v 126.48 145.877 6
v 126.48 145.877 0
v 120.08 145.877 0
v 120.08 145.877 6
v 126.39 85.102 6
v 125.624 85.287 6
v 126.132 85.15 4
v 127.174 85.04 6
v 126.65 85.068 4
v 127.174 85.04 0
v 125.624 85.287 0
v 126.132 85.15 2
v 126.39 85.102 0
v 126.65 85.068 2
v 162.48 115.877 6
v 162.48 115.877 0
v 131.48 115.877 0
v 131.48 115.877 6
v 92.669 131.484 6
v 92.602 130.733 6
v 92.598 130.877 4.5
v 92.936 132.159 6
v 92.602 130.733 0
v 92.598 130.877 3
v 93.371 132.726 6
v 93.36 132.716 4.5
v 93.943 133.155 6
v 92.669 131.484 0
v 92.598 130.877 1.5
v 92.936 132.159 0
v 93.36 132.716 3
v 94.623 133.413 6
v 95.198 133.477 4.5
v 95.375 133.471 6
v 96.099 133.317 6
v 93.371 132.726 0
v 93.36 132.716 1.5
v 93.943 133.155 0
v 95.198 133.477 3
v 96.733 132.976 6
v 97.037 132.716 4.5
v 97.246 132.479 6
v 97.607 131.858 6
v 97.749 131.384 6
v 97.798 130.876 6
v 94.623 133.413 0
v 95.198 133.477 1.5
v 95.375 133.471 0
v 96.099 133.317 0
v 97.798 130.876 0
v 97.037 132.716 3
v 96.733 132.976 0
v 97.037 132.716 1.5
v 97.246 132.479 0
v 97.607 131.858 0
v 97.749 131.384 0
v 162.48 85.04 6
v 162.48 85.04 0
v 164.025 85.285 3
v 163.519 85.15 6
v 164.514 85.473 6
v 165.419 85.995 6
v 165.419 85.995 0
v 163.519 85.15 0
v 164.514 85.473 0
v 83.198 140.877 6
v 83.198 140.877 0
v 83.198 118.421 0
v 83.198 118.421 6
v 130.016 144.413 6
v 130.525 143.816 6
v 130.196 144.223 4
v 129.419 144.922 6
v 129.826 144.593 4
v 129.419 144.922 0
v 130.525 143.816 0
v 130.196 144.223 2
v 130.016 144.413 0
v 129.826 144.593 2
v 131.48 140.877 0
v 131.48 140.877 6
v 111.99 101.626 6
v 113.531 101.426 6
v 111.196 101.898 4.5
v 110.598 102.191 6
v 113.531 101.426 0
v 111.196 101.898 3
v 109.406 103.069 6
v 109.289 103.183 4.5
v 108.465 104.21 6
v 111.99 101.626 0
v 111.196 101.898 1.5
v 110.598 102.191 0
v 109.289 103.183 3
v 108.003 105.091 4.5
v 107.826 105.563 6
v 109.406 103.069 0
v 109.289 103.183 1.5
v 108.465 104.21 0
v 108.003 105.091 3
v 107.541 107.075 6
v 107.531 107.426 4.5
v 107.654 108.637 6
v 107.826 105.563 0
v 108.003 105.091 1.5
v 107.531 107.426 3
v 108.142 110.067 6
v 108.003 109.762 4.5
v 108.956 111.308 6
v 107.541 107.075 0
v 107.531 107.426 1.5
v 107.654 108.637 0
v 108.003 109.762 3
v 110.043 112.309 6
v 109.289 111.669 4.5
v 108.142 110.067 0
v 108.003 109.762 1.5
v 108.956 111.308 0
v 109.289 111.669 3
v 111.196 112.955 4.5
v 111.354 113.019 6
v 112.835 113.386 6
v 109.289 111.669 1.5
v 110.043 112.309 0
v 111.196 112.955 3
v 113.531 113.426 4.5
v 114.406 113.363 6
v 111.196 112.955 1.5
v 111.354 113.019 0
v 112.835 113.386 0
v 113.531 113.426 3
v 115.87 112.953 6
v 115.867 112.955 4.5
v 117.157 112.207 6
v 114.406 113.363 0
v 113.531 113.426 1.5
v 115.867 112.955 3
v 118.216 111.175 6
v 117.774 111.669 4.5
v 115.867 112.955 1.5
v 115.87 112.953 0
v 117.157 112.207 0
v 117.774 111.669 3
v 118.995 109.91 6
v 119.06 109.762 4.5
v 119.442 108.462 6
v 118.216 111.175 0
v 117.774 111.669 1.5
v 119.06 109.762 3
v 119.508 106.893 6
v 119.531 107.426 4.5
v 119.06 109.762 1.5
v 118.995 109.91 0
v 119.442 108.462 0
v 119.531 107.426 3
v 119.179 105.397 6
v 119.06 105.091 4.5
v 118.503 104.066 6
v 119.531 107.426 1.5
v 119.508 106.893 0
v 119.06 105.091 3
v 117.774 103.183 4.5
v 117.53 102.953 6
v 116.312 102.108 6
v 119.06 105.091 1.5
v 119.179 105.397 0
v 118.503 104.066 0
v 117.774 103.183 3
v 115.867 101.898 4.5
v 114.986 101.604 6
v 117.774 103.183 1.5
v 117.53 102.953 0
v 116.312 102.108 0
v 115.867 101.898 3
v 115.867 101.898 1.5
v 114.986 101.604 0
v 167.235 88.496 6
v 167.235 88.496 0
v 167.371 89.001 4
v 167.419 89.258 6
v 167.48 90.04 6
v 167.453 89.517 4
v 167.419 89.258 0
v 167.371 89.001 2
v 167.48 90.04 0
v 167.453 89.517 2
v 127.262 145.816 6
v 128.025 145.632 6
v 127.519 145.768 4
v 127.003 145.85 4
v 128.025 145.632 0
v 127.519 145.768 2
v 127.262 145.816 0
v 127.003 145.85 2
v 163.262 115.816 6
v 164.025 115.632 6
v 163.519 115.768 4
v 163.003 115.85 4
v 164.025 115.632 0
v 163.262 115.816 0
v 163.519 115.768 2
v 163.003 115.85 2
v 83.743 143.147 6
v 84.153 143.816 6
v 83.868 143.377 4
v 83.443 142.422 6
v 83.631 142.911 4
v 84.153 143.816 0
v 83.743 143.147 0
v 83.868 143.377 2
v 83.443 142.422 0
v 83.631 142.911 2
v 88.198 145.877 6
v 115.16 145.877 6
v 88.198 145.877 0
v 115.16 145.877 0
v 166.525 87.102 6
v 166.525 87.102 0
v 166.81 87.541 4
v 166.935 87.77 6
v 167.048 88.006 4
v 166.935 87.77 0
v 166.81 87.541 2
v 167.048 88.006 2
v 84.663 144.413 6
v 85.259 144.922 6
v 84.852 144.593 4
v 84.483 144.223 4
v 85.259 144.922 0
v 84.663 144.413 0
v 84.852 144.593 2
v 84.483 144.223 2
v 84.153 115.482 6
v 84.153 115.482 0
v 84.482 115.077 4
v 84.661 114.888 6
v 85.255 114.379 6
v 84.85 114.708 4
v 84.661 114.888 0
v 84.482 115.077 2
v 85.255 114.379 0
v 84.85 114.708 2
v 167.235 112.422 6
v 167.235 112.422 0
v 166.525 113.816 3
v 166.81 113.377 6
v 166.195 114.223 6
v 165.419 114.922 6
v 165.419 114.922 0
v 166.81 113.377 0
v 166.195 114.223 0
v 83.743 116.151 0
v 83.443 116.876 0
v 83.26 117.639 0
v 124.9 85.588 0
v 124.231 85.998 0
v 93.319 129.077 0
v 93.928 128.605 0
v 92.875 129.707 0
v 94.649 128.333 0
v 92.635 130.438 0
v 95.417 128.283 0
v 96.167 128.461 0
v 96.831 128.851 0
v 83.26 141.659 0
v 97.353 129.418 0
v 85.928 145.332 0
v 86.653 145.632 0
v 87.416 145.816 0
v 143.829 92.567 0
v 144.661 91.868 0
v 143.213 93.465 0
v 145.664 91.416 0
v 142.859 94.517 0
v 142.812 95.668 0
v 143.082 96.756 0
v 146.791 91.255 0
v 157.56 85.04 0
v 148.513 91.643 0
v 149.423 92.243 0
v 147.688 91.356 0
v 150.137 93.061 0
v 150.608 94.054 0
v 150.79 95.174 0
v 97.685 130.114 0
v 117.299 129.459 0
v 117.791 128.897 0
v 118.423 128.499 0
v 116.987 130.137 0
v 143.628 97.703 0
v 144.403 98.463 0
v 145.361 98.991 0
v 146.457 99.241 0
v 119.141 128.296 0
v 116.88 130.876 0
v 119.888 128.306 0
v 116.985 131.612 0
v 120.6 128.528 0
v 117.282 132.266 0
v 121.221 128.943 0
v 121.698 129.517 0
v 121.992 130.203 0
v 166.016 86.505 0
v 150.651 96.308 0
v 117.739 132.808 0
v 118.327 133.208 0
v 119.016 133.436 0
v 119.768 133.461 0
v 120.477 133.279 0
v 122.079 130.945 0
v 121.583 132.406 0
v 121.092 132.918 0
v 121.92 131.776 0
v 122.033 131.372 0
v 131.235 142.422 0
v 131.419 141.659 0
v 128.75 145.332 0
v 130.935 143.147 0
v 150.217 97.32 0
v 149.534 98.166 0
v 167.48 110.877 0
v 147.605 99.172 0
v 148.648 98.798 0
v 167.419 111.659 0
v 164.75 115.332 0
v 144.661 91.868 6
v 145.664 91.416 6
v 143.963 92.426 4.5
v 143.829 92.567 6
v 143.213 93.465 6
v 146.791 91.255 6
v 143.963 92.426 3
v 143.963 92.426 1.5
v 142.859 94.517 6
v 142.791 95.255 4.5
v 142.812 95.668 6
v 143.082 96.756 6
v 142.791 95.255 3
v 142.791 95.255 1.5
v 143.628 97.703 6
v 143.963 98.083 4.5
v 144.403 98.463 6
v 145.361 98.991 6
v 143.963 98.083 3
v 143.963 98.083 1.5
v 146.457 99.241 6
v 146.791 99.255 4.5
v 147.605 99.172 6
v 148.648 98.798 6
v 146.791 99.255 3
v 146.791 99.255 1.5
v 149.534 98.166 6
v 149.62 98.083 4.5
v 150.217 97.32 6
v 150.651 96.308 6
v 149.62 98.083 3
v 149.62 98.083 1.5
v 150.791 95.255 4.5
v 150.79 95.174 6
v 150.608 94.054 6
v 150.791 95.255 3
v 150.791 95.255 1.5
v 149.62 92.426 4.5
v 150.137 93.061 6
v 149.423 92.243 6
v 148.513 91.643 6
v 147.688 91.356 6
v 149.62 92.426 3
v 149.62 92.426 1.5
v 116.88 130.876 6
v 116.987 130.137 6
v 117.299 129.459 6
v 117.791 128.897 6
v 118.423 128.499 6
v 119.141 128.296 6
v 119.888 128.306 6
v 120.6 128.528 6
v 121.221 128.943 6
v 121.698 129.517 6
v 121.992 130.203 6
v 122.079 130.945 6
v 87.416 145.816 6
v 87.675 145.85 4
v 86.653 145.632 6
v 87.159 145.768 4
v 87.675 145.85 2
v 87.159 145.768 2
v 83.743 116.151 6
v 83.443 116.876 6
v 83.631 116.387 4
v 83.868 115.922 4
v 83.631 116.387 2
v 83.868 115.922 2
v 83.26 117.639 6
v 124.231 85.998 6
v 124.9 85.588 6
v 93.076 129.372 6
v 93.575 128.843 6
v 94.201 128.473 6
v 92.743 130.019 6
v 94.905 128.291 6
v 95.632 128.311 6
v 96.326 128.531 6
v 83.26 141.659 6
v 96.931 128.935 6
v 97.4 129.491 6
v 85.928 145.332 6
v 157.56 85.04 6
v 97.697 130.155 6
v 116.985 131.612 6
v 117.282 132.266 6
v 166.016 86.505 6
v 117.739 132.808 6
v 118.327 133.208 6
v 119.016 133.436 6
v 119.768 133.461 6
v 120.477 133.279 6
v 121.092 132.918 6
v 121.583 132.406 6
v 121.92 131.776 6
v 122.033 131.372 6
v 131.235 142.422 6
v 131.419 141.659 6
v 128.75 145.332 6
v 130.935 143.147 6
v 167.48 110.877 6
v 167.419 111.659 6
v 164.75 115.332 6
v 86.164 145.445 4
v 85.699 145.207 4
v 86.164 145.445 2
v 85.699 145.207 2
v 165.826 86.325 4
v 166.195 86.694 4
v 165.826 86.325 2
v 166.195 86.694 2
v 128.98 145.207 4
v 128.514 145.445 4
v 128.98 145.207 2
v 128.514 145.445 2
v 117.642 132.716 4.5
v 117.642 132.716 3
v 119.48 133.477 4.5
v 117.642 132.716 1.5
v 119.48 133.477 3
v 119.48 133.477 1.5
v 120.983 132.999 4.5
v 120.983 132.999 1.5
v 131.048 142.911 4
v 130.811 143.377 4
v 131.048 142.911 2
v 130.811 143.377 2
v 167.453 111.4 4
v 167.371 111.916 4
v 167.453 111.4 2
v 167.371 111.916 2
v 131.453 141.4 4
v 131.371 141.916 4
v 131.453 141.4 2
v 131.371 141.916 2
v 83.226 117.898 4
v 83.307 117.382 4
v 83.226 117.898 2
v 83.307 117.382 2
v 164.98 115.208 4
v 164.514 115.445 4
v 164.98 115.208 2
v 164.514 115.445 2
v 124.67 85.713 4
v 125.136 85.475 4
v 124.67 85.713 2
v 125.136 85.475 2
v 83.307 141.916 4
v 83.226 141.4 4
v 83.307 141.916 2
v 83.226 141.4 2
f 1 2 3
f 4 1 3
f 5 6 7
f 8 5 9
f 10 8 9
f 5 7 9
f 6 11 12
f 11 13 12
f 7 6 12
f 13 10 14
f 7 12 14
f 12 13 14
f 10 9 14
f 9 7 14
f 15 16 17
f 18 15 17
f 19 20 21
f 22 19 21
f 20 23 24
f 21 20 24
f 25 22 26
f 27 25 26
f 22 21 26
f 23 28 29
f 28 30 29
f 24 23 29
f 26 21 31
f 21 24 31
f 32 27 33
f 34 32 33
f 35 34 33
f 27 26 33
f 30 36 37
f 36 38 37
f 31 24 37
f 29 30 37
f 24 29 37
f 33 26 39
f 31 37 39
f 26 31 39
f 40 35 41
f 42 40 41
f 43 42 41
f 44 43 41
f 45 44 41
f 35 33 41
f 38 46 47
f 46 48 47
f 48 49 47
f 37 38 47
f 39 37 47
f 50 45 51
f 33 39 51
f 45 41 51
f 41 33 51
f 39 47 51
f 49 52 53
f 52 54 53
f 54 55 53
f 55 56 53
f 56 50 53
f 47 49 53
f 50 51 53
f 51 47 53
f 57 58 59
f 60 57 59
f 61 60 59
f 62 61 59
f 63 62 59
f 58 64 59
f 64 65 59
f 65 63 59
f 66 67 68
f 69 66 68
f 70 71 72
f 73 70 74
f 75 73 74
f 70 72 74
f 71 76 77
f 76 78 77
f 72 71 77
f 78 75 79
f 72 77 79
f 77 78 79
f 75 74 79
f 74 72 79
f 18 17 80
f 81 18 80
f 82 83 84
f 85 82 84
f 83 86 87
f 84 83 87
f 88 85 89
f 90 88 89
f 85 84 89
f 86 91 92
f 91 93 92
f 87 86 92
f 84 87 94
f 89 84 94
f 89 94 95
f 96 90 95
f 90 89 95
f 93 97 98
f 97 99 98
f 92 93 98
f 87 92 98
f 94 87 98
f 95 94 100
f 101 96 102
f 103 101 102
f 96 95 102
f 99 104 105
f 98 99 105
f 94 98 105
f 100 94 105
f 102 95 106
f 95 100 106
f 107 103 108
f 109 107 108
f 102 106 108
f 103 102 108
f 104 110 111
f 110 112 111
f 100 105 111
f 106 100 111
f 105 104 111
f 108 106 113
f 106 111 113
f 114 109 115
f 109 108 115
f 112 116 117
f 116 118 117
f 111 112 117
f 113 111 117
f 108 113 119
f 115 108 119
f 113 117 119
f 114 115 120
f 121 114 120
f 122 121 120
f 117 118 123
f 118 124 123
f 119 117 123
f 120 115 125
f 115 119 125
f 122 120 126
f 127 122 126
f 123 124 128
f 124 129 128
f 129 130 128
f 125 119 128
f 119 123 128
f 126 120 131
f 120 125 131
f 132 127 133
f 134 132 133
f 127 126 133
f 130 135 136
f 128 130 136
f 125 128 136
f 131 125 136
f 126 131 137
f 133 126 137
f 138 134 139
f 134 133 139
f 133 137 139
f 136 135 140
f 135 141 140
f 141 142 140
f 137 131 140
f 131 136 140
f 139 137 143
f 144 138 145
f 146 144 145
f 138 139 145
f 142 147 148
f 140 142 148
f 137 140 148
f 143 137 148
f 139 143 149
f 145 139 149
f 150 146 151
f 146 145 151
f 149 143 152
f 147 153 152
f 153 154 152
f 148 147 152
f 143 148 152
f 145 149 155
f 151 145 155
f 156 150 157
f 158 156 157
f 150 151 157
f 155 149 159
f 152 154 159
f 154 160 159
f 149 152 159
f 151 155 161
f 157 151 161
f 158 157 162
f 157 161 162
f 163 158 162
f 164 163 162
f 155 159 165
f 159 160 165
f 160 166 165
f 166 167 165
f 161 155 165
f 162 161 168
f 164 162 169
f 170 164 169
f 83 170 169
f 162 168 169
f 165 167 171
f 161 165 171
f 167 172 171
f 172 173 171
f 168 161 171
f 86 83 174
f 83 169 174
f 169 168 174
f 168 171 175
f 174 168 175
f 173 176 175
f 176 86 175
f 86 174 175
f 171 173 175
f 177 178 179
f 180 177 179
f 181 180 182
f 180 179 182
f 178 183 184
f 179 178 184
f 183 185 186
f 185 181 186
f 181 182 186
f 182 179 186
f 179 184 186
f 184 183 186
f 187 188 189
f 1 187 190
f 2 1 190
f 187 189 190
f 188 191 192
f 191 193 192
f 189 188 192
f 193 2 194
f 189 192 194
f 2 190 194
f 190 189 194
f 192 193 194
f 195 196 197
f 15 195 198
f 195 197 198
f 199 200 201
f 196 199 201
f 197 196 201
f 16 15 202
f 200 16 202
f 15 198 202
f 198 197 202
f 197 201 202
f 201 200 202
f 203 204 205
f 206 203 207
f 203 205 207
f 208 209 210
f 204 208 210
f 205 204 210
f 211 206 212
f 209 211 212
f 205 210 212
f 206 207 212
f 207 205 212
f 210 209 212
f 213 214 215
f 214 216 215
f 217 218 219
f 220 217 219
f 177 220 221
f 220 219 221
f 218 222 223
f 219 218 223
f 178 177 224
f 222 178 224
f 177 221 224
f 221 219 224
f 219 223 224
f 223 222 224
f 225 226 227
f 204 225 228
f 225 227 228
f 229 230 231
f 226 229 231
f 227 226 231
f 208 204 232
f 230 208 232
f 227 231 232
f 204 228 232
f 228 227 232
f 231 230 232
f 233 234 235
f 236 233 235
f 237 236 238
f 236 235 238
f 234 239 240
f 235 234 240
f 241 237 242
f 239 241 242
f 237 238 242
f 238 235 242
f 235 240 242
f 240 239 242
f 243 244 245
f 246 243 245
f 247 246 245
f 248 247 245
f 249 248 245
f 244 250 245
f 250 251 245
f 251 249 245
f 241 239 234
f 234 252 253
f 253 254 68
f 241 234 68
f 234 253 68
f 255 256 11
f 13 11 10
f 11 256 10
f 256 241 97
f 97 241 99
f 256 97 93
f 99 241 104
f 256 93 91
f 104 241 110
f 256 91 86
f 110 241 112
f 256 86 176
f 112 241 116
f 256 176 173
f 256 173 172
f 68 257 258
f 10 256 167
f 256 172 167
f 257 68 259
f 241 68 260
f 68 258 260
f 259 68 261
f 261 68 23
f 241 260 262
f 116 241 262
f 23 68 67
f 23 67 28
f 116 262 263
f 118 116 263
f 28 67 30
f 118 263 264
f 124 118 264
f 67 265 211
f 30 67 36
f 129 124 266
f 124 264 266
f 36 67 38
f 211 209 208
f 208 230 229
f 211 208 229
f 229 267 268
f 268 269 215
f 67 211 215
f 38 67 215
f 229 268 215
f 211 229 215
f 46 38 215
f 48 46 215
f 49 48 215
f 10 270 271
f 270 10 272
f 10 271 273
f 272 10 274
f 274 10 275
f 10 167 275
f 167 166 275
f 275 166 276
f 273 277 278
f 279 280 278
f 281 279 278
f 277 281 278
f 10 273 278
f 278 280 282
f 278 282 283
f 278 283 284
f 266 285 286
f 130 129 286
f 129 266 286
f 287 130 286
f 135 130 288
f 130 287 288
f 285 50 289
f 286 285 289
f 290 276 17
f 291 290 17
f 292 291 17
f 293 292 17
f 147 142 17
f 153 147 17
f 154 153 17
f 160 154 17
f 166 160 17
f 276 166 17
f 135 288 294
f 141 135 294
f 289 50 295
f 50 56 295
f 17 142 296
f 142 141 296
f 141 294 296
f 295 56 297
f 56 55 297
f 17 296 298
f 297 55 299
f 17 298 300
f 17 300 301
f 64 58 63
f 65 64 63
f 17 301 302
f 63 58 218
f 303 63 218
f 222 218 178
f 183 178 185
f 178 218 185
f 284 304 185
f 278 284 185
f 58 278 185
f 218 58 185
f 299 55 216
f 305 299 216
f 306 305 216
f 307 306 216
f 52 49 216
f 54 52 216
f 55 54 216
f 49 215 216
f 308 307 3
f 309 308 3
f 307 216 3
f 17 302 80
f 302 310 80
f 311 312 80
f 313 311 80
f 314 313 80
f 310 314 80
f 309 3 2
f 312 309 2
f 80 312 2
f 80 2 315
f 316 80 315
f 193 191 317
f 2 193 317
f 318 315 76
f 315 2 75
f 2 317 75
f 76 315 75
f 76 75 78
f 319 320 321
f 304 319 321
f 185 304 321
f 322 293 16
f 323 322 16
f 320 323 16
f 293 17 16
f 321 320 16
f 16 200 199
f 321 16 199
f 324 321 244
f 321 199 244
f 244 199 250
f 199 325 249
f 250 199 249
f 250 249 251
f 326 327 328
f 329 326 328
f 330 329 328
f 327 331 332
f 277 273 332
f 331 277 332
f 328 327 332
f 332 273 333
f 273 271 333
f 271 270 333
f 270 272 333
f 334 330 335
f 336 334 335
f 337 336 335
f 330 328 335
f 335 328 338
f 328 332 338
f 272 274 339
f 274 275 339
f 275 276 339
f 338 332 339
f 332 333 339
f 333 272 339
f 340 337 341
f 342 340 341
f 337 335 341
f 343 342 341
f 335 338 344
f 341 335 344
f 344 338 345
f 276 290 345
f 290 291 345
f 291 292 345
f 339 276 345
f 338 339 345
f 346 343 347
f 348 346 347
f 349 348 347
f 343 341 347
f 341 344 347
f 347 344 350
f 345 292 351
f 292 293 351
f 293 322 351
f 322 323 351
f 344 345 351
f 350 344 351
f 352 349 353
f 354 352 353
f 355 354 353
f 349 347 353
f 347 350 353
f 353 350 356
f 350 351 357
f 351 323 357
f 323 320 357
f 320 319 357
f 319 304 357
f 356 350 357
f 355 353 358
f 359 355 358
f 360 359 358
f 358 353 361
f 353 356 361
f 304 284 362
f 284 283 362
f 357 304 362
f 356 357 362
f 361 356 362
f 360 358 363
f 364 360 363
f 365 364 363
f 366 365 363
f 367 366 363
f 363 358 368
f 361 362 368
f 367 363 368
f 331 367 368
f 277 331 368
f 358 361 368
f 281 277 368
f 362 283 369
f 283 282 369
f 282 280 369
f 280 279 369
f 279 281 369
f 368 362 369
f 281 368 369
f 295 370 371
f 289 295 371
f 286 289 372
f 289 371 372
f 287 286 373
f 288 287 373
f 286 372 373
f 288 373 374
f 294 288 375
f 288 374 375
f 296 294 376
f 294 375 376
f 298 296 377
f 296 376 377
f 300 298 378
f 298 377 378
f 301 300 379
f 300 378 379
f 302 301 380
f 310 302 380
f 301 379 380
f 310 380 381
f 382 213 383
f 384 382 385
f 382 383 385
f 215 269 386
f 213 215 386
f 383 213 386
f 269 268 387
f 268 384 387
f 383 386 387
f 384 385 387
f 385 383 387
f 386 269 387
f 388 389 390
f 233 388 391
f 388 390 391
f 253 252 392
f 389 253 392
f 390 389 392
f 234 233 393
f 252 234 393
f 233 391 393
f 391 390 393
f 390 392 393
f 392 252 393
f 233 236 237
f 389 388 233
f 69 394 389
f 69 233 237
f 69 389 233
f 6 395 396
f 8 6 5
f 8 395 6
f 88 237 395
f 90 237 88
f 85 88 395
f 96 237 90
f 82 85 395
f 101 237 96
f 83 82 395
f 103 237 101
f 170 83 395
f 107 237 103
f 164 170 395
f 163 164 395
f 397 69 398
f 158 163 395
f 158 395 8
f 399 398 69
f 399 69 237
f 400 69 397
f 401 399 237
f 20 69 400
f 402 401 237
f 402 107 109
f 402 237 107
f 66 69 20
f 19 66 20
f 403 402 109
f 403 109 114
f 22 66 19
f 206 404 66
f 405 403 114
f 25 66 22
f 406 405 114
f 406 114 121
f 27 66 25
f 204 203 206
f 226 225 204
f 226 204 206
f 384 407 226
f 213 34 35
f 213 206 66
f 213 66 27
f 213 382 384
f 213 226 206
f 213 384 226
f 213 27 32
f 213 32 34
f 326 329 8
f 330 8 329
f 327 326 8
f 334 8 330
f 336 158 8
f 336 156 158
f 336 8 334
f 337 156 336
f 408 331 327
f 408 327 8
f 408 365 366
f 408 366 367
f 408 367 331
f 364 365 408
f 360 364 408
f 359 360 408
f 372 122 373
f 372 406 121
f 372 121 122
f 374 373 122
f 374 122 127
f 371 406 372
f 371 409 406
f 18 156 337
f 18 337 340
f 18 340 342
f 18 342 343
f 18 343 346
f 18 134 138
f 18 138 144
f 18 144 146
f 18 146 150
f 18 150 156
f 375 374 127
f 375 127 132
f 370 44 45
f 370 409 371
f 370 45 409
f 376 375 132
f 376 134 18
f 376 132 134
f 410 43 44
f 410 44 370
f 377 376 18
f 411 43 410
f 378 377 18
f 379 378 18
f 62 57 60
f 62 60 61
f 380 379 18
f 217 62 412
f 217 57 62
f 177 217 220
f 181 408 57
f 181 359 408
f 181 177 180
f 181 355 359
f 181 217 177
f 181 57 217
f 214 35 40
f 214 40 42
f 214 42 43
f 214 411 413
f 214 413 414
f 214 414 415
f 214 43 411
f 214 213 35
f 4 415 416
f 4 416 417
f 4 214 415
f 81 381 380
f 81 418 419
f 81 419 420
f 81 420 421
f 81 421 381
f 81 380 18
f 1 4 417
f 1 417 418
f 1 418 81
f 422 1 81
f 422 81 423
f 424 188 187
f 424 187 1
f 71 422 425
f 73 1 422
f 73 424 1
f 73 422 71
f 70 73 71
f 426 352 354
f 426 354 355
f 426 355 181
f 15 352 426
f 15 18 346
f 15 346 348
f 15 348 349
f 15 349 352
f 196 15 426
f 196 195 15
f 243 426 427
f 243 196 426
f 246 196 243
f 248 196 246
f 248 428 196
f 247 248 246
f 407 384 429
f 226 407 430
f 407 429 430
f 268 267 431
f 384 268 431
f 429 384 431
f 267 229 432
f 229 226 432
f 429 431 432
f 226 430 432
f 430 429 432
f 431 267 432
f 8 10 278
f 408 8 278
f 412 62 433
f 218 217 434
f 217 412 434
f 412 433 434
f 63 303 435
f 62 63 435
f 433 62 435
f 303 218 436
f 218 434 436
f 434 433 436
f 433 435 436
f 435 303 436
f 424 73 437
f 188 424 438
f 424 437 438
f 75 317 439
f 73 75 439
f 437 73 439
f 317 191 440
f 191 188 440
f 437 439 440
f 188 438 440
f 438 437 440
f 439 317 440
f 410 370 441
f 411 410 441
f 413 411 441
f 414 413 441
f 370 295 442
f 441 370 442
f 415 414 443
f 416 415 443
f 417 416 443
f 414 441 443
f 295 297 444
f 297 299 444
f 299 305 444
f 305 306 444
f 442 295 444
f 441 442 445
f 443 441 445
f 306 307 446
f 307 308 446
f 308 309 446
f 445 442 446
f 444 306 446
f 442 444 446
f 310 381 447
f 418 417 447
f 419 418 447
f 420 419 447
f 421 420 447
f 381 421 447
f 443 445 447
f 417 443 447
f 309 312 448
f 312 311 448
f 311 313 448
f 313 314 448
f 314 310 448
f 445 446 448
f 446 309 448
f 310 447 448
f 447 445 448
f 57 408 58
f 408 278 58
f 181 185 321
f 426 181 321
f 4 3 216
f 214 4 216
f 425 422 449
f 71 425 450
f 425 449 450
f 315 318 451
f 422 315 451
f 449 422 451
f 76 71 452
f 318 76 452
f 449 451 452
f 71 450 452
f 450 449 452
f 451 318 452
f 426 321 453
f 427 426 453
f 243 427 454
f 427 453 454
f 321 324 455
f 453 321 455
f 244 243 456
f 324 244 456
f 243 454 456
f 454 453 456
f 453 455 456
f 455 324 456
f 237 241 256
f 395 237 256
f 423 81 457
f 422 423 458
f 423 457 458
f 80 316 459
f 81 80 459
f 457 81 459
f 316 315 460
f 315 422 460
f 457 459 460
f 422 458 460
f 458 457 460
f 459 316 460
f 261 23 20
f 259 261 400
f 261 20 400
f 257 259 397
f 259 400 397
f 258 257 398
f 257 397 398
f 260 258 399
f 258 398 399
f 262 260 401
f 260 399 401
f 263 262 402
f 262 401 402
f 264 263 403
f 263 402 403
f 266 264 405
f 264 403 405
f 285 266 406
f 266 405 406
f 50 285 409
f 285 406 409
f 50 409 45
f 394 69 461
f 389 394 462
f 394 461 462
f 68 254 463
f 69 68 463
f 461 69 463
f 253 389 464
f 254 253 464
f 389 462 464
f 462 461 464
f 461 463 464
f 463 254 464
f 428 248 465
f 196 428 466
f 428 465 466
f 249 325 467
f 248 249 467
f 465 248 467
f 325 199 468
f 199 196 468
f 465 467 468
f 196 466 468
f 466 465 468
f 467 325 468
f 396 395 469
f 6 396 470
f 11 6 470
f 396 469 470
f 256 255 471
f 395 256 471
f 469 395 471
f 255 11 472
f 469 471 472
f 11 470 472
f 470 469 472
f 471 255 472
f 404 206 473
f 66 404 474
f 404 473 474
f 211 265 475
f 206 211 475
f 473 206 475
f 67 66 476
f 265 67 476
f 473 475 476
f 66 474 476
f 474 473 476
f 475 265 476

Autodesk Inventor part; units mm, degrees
ref_plane "YZ Plane" through (0, 0, 0) normal (1, 0, 0) x (0, 1, 0)
ref_plane "XZ Plane" through (0, 0, 0) normal (0, 1, 0) x (-1, 0, 0)
ref_plane "XY Plane" through (0, 0, 0) normal (0, 0, 1) x (1, 0, 0)
sketch "Sketch1" plane through (0, 0, 0) normal (0, 0, 1) x (1, 0, 0)
  line L0 (83.1982, 140.877) -> (83.1982, 118.4214)
  spline S0 degree 3 poles (83.1982, 118.4214) (83.1982, 117.8956) (83.2805, 117.3761) (83.443, 116.8762) knots 1 1 1 1 2 2 2 2
  line L1 (83.1982, 118.4214) -> (83.1982, 117.8956) construction
  line L2 (83.1982, 117.8956) -> (83.2805, 117.3761) construction
  line L3 (83.2805, 117.3761) -> (83.443, 116.8762) construction
  spline S1 degree 3 poles (83.443, 116.8762) (83.6054, 116.3762) (83.8442, 115.9078) (84.1532, 115.4824) knots 2 2 2 2 3 3 3 3
  line L4 (83.443, 116.8762) -> (83.6054, 116.3762) construction
  line L5 (83.6054, 116.3762) -> (83.8442, 115.9078) construction
  line L6 (83.8442, 115.9078) -> (84.1532, 115.4824) construction
  spline S2 degree 3 poles (84.1532, 115.4824) (84.4612, 115.0586) (84.8315, 114.6879) (85.2551, 114.3792) knots 3 3 3 3 4 4 4 4
  line L7 (84.1532, 115.4824) -> (84.4612, 115.0586) construction
  line L8 (84.4612, 115.0586) -> (84.8315, 114.6879) construction
  line L9 (84.8315, 114.6879) -> (85.2551, 114.3792) construction
  line L10 (85.2551, 114.3792) -> (124.2313, 85.9985)
  spline S3 degree 3 poles (124.2313, 85.9985) (124.6565, 85.689) (125.1247, 85.4497) (125.6245, 85.2868) knots 5 5 5 5 6 6 6 6
  line L11 (124.2313, 85.9985) -> (124.6565, 85.689) construction
  line L12 (124.6565, 85.689) -> (125.1247, 85.4497) construction
  line L13 (125.1247, 85.4497) -> (125.6245, 85.2868) construction
  spline S4 degree 3 poles (125.6245, 85.2868) (126.1262, 85.1233) (126.647, 85.0405) (127.1745, 85.0405) knots 6 6 6 6 7 7 7 7
  line L14 (125.6245, 85.2868) -> (126.1262, 85.1233) construction
  line L15 (126.1262, 85.1233) -> (126.647, 85.0405) construction
  line L16 (126.647, 85.0405) -> (127.1745, 85.0405) construction
  line L17 (127.1745, 85.0405) -> (157.5604, 85.0405)
  line L18 (157.5604, 85.0405) -> (162.48, 85.0405)
  spline S5 degree 3 poles (162.48, 85.0405) (163.0057, 85.0405) (163.5251, 85.1228) (164.0251, 85.2852) (164.5252, 85.4477) (164.9935, 85.6864) (165.419, 85.9954) knots 9 9 9 9 10 10 10 11 11 11 11
  line L19 (162.48, 85.0405) -> (163.0057, 85.0405) construction
  line L20 (163.0057, 85.0405) -> (163.5251, 85.1228) construction
  line L21 (163.5251, 85.1228) -> (164.0251, 85.2852) construction
  line L22 (164.0251, 85.2852) -> (164.5252, 85.4477) construction
  line L23 (164.5252, 85.4477) -> (164.9935, 85.6864) construction
  line L24 (164.9935, 85.6864) -> (165.419, 85.9954) construction
  spline S6 degree 3 poles (165.419, 85.9954) (165.8443, 86.3045) (166.216, 86.6762) (166.5251, 87.1017) knots 11 11 11 11 12 12 12 12
  line L25 (165.419, 85.9954) -> (165.8443, 86.3045) construction
  line L26 (165.8443, 86.3045) -> (166.216, 86.6762) construction
  line L27 (166.216, 86.6762) -> (166.5251, 87.1017) construction
  spline S7 degree 3 poles (166.5251, 87.1017) (166.8341, 87.5268) (167.0728, 87.9953) (167.2353, 88.4955) knots 12 12 12 12 13 13 13 13
  line L28 (166.5251, 87.1017) -> (166.8341, 87.5268) construction
  line L29 (166.8341, 87.5268) -> (167.0728, 87.9953) construction
  line L30 (167.0728, 87.9953) -> (167.2353, 88.4955) construction
  spline S8 degree 3 poles (167.2353, 88.4955) (167.3977, 88.9954) (167.48, 89.5146) (167.48, 90.0403) knots 13 13 13 13 14 14 14 14
  line L31 (167.2353, 88.4955) -> (167.3977, 88.9954) construction
  line L32 (167.3977, 88.9954) -> (167.48, 89.5146) construction
  line L33 (167.48, 89.5146) -> (167.48, 90.0403) construction
  line L34 (167.48, 90.0403) -> (167.48, 110.877)
  spline S9 degree 3 poles (167.48, 110.877) (167.48, 111.4027) (167.3977, 111.9219) (167.2353, 112.4221) knots 15 15 15 15 16 16 16 16
  line L35 (167.48, 110.877) -> (167.48, 111.4027) construction
  line L36 (167.48, 111.4027) -> (167.3977, 111.9219) construction
  line L37 (167.3977, 111.9219) -> (167.2353, 112.4221) construction
  spline S10 degree 3 poles (167.2353, 112.4221) (167.0728, 112.9221) (166.8341, 113.3905) (166.5251, 113.816) (166.216, 114.2414) (165.8443, 114.6132) (165.419, 114.9222) knots 16 16 16 16 17 17 17 18 18 18 18
  line L38 (167.2353, 112.4221) -> (167.0728, 112.9221) construction
  line L39 (167.0728, 112.9221) -> (166.8341, 113.3905) construction
  line L40 (166.8341, 113.3905) -> (166.5251, 113.816) construction
  line L41 (166.5251, 113.816) -> (166.216, 114.2414) construction
  line L42 (166.216, 114.2414) -> (165.8443, 114.6132) construction
  line L43 (165.8443, 114.6132) -> (165.419, 114.9222) construction
  spline S11 degree 3 poles (165.419, 114.9222) (164.9935, 115.2312) (164.5252, 115.47) (164.0251, 115.6322) knots 18 18 18 18 19 19 19 19
  line L44 (165.419, 114.9222) -> (164.9935, 115.2312) construction
  line L45 (164.9935, 115.2312) -> (164.5252, 115.47) construction
  line L46 (164.5252, 115.47) -> (164.0251, 115.6322) construction
  spline S12 degree 3 poles (164.0251, 115.6322) (163.5251, 115.7948) (163.0057, 115.877) (162.48, 115.877) knots 19 19 19 19 20 20 20 20
  line L47 (164.0251, 115.6322) -> (163.5251, 115.7948) construction
  line L48 (163.5251, 115.7948) -> (163.0057, 115.877) construction
  line L49 (163.0057, 115.877) -> (162.48, 115.877) construction
  line L50 (162.48, 115.877) -> (131.48, 115.877)
  line L51 (131.48, 115.877) -> (131.48, 140.877)
  spline S13 degree 3 poles (131.48, 140.877) (131.48, 141.4029) (131.3978, 141.9221) (131.2352, 142.422) knots 22 22 22 22 23 23 23 23
  line L52 (131.48, 140.877) -> (131.48, 141.4029) construction
  line L53 (131.48, 141.4029) -> (131.3978, 141.9221) construction
  line L54 (131.3978, 141.9221) -> (131.2352, 142.422) construction
  spline S14 degree 3 poles (131.2352, 142.422) (131.073, 142.9222) (130.8342, 143.3906) (130.5252, 143.8159) knots 23 23 23 23 24 24 24 24
  line L55 (131.2352, 142.422) -> (131.073, 142.9222) construction
  line L56 (131.073, 142.9222) -> (130.8342, 143.3906) construction
  line L57 (130.8342, 143.3906) -> (130.5252, 143.8159) construction
  spline S15 degree 3 poles (130.5252, 143.8159) (130.2162, 144.2413) (129.8443, 144.6131) (129.419, 144.9221) knots 24 24 24 24 25 25 25 25
  line L58 (130.5252, 143.8159) -> (130.2162, 144.2413) construction
  line L59 (130.2162, 144.2413) -> (129.8443, 144.6131) construction
  line L60 (129.8443, 144.6131) -> (129.419, 144.9221) construction
  spline S16 degree 3 poles (129.419, 144.9221) (128.9935, 145.2311) (128.5251, 145.4698) (128.0251, 145.6325) knots 25 25 25 25 26 26 26 26
  line L61 (129.419, 144.9221) -> (128.9935, 145.2311) construction
  line L62 (128.9935, 145.2311) -> (128.5251, 145.4698) construction
  line L63 (128.5251, 145.4698) -> (128.0251, 145.6325) construction
  spline S17 degree 3 poles (128.0251, 145.6325) (127.525, 145.7947) (127.0057, 145.8771) (126.48, 145.8771) knots 26 26 26 26 27 27 27 27
  line L64 (128.0251, 145.6325) -> (127.525, 145.7947) construction
  line L65 (127.525, 145.7947) -> (127.0057, 145.8771) construction
  line L66 (127.0057, 145.8771) -> (126.48, 145.8771) construction
  line L67 (126.48, 145.8771) -> (120.08, 145.8771)
  line L68 (120.08, 145.8771) -> (115.1604, 145.8771)
  line L69 (115.1604, 145.8771) -> (88.1982, 145.8771)
  spline S18 degree 3 poles (88.1982, 145.8771) (87.6723, 145.8771) (87.1532, 145.7947) (86.6533, 145.6325) knots 30 30 30 30 31 31 31 31
  line L70 (88.1982, 145.8771) -> (87.6723, 145.8771) construction
  line L71 (87.6723, 145.8771) -> (87.1532, 145.7947) construction
  line L72 (87.1532, 145.7947) -> (86.6533, 145.6325) construction
  spline S19 degree 3 poles (86.6533, 145.6325) (86.1531, 145.4698) (85.6845, 145.2311) (85.2594, 144.9221) knots 31 31 31 31 32 32 32 32
  line L73 (86.6533, 145.6325) -> (86.1531, 145.4698) construction
  line L74 (86.1531, 145.4698) -> (85.6845, 145.2311) construction
  line L75 (85.6845, 145.2311) -> (85.2594, 144.9221) construction
  spline S20 degree 3 poles (85.2594, 144.9221) (84.8339, 144.6131) (84.4622, 144.2413) (84.1532, 143.8159) knots 32 32 32 32 33 33 33 33
  line L76 (85.2594, 144.9221) -> (84.8339, 144.6131) construction
  line L77 (84.8339, 144.6131) -> (84.4622, 144.2413) construction
  line L78 (84.4622, 144.2413) -> (84.1532, 143.8159) construction
  spline S21 degree 3 poles (84.1532, 143.8159) (83.8442, 143.3906) (83.6054, 142.9222) (83.443, 142.422) knots 33 33 33 33 34 34 34 34
  line L79 (84.1532, 143.8159) -> (83.8442, 143.3906) construction
  line L80 (83.8442, 143.3906) -> (83.6054, 142.9222) construction
  line L81 (83.6054, 142.9222) -> (83.443, 142.422) construction
  spline S22 degree 3 poles (83.443, 142.422) (83.2805, 141.9221) (83.1982, 141.4029) (83.1982, 140.877) knots 34 34 34 34 35 35 35 35
  line L82 (83.443, 142.422) -> (83.2805, 141.9221) construction
  line L83 (83.2805, 141.9221) -> (83.1982, 141.4029) construction
  line L84 (83.1982, 141.4029) -> (83.1982, 140.877) construction
  spline S23 degree 3 poles (146.7912, 91.2547) (144.5819, 91.2547) (142.7911, 93.0455) (142.7911, 95.2547) (142.7911, 97.4638) (144.5819, 99.2546) (146.7912, 99.2546) (149.0002, 99.2546) (150.7911, 97.4638) (150.7911, 95.2547) (150.7911, 93.0455) (149.0002, 91.2547) (146.7912, 91.2547) knots 0 0 0 0 1 1 1 2 2 2 3 3 3 4 4 4 4
  line L85 (146.7912, 91.2547) -> (144.5819, 91.2547) construction
  line L86 (144.5819, 91.2547) -> (142.7911, 93.0455) construction
  line L87 (142.7911, 93.0455) -> (142.7911, 95.2547) construction
  line L88 (142.7911, 95.2547) -> (142.7911, 97.4638) construction
  line L89 (142.7911, 97.4638) -> (144.5819, 99.2546) construction
  line L90 (144.5819, 99.2546) -> (146.7912, 99.2546) construction
  line L91 (146.7912, 99.2546) -> (149.0002, 99.2546) construction
  line L92 (149.0002, 99.2546) -> (150.7911, 97.4638) construction
  line L93 (150.7911, 97.4638) -> (150.7911, 95.2547) construction
  line L94 (150.7911, 95.2547) -> (150.7911, 93.0455) construction
  line L95 (150.7911, 93.0455) -> (149.0002, 91.2547) construction
  line L96 (149.0002, 91.2547) -> (146.7912, 91.2547) construction
  spline S24 degree 3 poles (95.1982, 128.2771) (93.7622, 128.2771) (92.5981, 129.4412) (92.5981, 130.8771) (92.5981, 132.313) (93.7622, 133.4771) (95.1982, 133.4771) (96.6341, 133.4771) (97.7982, 132.313) (97.7982, 130.8771) (97.7982, 129.4412) (96.6341, 128.2771) (95.1982, 128.2771) knots 0 0 0 0 1 1 1 2 2 2 3 3 3 4 4 4 4
  line L97 (95.1982, 128.2771) -> (93.7622, 128.2771) construction
  line L98 (93.7622, 128.2771) -> (92.5981, 129.4412) construction
  line L99 (92.5981, 129.4412) -> (92.5981, 130.8771) construction
  line L100 (92.5981, 130.8771) -> (92.5981, 132.313) construction
  line L101 (92.5981, 132.313) -> (93.7622, 133.4771) construction
  line L102 (93.7622, 133.4771) -> (95.1982, 133.4771) construction
  line L103 (95.1982, 133.4771) -> (96.6341, 133.4771) construction
  line L104 (96.6341, 133.4771) -> (97.7982, 132.313) construction
  line L105 (97.7982, 132.313) -> (97.7982, 130.8771) construction
  line L106 (97.7982, 130.8771) -> (97.7982, 129.4412) construction
  line L107 (97.7982, 129.4412) -> (96.6341, 128.2771) construction
  line L108 (96.6341, 128.2771) -> (95.1982, 128.2771) construction
  spline S25 degree 3 poles (119.48, 128.2771) (118.044, 128.2771) (116.88, 129.4412) (116.88, 130.8771) (116.88, 132.313) (118.044, 133.4771) (119.48, 133.4771) (120.916, 133.4771) (122.0799, 132.313) (122.0799, 130.8771) (122.0799, 129.4412) (120.916, 128.2771) (119.48, 128.2771) knots 0 0 0 0 1 1 1 2 2 2 3 3 3 4 4 4 4
  line L109 (119.48, 128.2771) -> (118.044, 128.2771) construction
  line L110 (118.044, 128.2771) -> (116.88, 129.4412) construction
  line L111 (116.88, 129.4412) -> (116.88, 130.8771) construction
  line L112 (116.88, 130.8771) -> (116.88, 132.313) construction
  line L113 (116.88, 132.313) -> (118.044, 133.4771) construction
  line L114 (118.044, 133.4771) -> (119.48, 133.4771) construction
  line L115 (119.48, 133.4771) -> (120.916, 133.4771) construction
  line L116 (120.916, 133.4771) -> (122.0799, 132.313) construction
  line L117 (122.0799, 132.313) -> (122.0799, 130.8771) construction
  line L118 (122.0799, 130.8771) -> (122.0799, 129.4412) construction
  line L119 (122.0799, 129.4412) -> (120.916, 128.2771) construction
  line L120 (120.916, 128.2771) -> (119.48, 128.2771) construction
  spline S26 degree 3 poles (146.7912, 91.5045) (144.72, 91.5045) (143.0412, 93.1836) (143.0412, 95.2547) (143.0412, 97.3257) (144.72, 99.0045) (146.7912, 99.0045) (148.8622, 99.0045) (150.5412, 97.3257) (150.5412, 95.2547) (150.5412, 93.1836) (148.8622, 91.5045) (146.7912, 91.5045) knots 0 0 0 0 1 1 1 2 2 2 3 3 3 4 4 4 4
  line L121 (146.7912, 91.5045) -> (144.72, 91.5045) construction
  line L122 (144.72, 91.5045) -> (143.0412, 93.1836) construction
  line L123 (143.0412, 93.1836) -> (143.0412, 95.2547) construction
  line L124 (143.0412, 95.2547) -> (143.0412, 97.3257) construction
  line L125 (143.0412, 97.3257) -> (144.72, 99.0045) construction
  line L126 (144.72, 99.0045) -> (146.7912, 99.0045) construction
  line L127 (146.7912, 99.0045) -> (148.8622, 99.0045) construction
  line L128 (148.8622, 99.0045) -> (150.5412, 97.3257) construction
  line L129 (150.5412, 97.3257) -> (150.5412, 95.2547) construction
  line L130 (150.5412, 95.2547) -> (150.5412, 93.1836) construction
  line L131 (150.5412, 93.1836) -> (148.8622, 91.5045) construction
  line L132 (148.8622, 91.5045) -> (146.7912, 91.5045) construction
  spline S27 degree 3 poles (113.5312, 101.426) (110.2174, 101.426) (107.5312, 104.1123) (107.5312, 107.426) (107.5312, 110.7398) (110.2174, 113.426) (113.5312, 113.426) (116.8449, 113.426) (119.5312, 110.7398) (119.5312, 107.426) (119.5312, 104.1123) (116.8449, 101.426) (113.5312, 101.426) knots 0 0 0 0 1 1 1 2 2 2 3 3 3 4 4 4 4
  line L133 (113.5312, 101.426) -> (110.2174, 101.426) construction
  line L134 (110.2174, 101.426) -> (107.5312, 104.1123) construction
  line L135 (107.5312, 104.1123) -> (107.5312, 107.426) construction
  line L136 (107.5312, 107.426) -> (107.5312, 110.7398) construction
  line L137 (107.5312, 110.7398) -> (110.2174, 113.426) construction
  line L138 (110.2174, 113.426) -> (113.5312, 113.426) construction
  line L139 (113.5312, 113.426) -> (116.8449, 113.426) construction
  line L140 (116.8449, 113.426) -> (119.5312, 110.7398) construction
  line L141 (119.5312, 110.7398) -> (119.5312, 107.426) construction
  line L142 (119.5312, 107.426) -> (119.5312, 104.1123) construction
  line L143 (119.5312, 104.1123) -> (116.8449, 101.426) construction
  line L144 (116.8449, 101.426) -> (113.5312, 101.426) construction
  point P0 (0, 0)
extrude "Extrusion1" add sketch "Sketch1" along normal blind 6 contours S22 S21 S20 S19 S18 L69 L68 L67 S17 S16 S15 S14 S13 L51 L50 S12 S11 S10 S9 L34 S8 S7 S6 S5 L18 L17 S4 S3 L10 S2 S1 S0 L0
sketch "Sketch2" plane through (0, 0, 0) normal (0, 0, -1) x (-1, 0, 0)
  line L0 (-83.1982, 140.877) -> (-83.1982, 118.4214) projected
  line L1 (-126.48, 145.8771) -> (-88.1982, 145.8771) projected
  line L2 (-131.48, 115.877) -> (-131.48, 140.877) projected
  line L3 (-162.48, 115.877) -> (-131.48, 115.877) projected
  line L4 (-167.48, 90.0403) -> (-167.48, 110.877) projected
  line L5 (-127.1745, 85.0405) -> (-162.48, 85.0405) projected
  line L6 (-85.2551, 114.3792) -> (-124.2313, 85.9985) projected
  line L7 (-92.5981, 130.874) -> (-97.7982, 130.874)
  line L8 (-116.88, 130.874) -> (-122.0799, 130.874)
  point P0 (0, 0)
  point P1 (-113.5312, 101.426)
  point P2 (-146.7912, 91.2547)
  point P3 (-95.1982, 128.2771)
  point P4 (-119.48, 128.2771)
  point P5 (-83.443, 116.8762)
  point P6 (-83.443, 142.422)
  point P7 (-84.1532, 143.8159)
  point P8 (-85.2594, 144.9221)
  point P9 (-86.6533, 145.6325)
  point P10 (-128.0251, 145.6325)
  point P11 (-129.419, 144.9221)
  point P12 (-130.5252, 143.8159)
  point P13 (-131.2352, 142.422)
  point P14 (-164.0251, 115.6322)
  point P15 (-165.419, 114.9222)
  point P16 (-167.2353, 112.4221)
  point P17 (-167.2353, 88.4955)
  point P18 (-166.5251, 87.1017)
  point P19 (-165.419, 85.9954)
  point P20 (-125.6245, 85.2868)
  point P21 (-84.1532, 115.4824)
  point P22 (-95.1982, 130.874)
  point P23 (-119.48, 130.874)
hole "Hole1" at (95.1982, 130.874, 0) at (119.48, 130.874, 0) direction (0, 0, 1) diameter 5.2 end through all
properties part number "Leadscrew-rod-holder"
